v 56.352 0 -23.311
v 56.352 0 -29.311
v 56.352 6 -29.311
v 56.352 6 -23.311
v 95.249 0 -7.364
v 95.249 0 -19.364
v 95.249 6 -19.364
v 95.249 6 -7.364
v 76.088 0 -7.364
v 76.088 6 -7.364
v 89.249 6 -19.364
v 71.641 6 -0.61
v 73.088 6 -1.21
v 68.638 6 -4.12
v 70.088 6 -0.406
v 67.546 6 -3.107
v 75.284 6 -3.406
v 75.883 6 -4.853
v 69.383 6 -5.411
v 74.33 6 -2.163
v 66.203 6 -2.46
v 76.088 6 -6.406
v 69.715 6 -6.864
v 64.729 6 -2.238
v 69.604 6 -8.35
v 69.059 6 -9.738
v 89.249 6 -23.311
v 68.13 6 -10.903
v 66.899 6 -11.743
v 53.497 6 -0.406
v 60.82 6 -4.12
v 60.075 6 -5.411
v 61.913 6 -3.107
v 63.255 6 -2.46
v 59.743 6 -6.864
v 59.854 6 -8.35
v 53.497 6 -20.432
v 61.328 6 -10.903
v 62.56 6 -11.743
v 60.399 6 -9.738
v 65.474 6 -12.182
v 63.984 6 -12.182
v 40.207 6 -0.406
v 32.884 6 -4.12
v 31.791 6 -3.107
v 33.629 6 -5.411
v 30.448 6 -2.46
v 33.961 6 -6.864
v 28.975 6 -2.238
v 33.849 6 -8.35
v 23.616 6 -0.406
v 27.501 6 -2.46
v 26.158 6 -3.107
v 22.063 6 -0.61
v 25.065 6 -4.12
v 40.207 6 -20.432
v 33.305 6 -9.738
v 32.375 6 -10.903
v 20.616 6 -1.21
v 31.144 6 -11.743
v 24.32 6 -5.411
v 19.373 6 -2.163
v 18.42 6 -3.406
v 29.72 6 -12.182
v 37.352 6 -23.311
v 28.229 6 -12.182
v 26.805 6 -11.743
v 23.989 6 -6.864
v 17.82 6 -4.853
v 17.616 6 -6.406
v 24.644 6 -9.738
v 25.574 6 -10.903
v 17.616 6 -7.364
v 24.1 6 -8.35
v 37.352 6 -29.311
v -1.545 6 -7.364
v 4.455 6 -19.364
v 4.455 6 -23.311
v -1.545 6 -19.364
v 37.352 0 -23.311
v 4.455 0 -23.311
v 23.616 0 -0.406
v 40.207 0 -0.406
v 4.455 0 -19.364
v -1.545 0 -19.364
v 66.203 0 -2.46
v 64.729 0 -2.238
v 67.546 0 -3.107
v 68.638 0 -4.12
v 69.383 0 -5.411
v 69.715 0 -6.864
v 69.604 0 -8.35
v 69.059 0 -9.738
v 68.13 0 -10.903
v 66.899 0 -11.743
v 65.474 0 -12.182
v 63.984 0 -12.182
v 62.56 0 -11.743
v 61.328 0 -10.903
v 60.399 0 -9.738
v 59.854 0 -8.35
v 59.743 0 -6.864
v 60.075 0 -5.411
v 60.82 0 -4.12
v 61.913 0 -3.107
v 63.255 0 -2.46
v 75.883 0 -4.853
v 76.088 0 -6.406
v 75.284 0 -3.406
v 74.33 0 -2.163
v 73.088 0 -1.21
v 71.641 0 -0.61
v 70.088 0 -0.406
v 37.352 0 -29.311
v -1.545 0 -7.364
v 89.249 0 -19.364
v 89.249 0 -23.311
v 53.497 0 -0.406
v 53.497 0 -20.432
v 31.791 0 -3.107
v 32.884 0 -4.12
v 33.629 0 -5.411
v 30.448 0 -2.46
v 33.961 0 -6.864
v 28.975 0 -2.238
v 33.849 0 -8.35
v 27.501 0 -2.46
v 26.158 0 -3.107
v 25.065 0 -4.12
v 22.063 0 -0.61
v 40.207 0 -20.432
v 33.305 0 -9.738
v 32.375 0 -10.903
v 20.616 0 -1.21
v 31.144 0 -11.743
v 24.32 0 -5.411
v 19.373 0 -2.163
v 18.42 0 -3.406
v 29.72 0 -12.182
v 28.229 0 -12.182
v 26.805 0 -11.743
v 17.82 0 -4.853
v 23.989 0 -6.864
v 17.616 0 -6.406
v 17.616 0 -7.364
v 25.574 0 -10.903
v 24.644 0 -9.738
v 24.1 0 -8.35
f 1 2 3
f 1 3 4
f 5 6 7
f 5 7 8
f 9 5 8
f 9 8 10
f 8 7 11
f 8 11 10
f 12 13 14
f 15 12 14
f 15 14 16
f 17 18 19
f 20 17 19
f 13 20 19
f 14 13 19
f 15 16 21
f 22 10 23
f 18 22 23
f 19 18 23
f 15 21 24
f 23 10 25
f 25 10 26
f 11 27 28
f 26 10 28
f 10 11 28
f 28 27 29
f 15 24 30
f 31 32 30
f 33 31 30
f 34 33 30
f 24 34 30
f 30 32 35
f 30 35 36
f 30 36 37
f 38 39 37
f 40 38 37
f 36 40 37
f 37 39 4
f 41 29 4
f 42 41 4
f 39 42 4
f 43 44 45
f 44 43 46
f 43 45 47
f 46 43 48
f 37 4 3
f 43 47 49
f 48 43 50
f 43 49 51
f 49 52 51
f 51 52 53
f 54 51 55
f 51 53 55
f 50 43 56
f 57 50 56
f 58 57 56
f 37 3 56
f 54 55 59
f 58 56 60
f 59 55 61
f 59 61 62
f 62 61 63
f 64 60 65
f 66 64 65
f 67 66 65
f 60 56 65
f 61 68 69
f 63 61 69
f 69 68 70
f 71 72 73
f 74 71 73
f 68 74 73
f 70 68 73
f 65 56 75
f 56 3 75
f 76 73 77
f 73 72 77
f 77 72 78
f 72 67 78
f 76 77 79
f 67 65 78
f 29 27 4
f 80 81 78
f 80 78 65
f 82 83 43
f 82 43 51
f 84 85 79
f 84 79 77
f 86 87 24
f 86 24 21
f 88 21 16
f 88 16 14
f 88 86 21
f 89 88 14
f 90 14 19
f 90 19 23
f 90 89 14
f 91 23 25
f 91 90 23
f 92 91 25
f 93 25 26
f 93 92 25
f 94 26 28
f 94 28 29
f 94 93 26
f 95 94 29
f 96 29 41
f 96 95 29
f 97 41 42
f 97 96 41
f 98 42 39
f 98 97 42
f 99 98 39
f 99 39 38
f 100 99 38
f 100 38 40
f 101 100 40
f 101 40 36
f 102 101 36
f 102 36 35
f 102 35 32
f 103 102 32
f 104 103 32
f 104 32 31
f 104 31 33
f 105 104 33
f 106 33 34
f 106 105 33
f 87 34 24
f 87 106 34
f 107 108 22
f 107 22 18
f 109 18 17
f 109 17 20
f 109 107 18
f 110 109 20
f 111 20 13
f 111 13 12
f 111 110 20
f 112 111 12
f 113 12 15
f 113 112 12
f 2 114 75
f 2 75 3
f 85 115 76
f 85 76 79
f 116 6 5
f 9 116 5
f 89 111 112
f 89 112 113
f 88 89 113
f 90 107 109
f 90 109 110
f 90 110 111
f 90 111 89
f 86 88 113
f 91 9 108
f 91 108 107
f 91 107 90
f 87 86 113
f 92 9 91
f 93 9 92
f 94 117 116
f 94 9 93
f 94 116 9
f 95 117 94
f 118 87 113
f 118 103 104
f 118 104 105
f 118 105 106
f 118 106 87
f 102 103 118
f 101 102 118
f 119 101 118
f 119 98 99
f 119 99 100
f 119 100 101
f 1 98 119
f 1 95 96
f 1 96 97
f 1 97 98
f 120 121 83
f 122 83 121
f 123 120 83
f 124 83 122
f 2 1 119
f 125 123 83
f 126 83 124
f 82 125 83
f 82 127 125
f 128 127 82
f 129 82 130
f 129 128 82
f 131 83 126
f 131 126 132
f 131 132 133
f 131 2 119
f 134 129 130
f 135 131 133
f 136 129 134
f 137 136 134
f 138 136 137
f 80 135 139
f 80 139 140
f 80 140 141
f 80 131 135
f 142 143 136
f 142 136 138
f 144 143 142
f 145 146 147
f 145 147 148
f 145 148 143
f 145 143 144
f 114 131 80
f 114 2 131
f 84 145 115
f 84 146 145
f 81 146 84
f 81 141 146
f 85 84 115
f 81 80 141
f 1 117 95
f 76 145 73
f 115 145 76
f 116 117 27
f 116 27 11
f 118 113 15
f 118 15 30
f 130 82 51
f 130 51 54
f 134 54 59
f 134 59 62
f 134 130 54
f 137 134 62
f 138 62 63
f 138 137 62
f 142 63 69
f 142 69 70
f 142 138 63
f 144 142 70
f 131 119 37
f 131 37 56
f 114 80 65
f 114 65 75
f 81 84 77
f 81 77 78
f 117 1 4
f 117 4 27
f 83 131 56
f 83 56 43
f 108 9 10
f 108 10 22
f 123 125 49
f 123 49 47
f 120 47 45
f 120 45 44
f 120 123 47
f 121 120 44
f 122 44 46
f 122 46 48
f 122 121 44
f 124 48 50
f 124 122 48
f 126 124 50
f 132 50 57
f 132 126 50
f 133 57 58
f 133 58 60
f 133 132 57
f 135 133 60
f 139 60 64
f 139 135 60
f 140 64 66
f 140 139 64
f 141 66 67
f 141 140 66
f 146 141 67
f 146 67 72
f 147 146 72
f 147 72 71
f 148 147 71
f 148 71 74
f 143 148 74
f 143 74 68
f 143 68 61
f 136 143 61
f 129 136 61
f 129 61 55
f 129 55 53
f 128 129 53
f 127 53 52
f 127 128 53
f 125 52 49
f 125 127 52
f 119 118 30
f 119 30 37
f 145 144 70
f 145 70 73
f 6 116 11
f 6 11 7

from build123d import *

# Parameters (mm, degrees)
SKETCH1_R           = 5
BOSS_EXTRUDE1_DEPTH = 6


with BuildPart() as part:
    # Sketch1 → Boss-Extrude1 (new body)
    with BuildSketch(Plane(origin=(0, 0, 0), x_dir=(1, 0, 0), z_dir=(0, 1, 0))):
        with BuildLine():
            Line((17.615827491, 6.405693798), (17.615827491, 7.364453077))
            Line((17.615827491, 7.364453077), (-1.545270838, 7.364453077))
            Line((-1.545270838, 7.364453077), (-1.545270838, 19.364453077))
            Line((-1.545270838, 19.364453077), (4.454729162, 19.364453077))
            Line((4.454729162, 19.364453077), (4.454729162, 23.311113477))
            Line((4.454729162, 23.311113477), (37.351818757, 23.311113477))
            Line((37.351818757, 23.311113477), (37.351818757, 29.311113477))
            Line((37.351818757, 29.311113477), (56.351818757, 29.311113477))
            Line((56.351818757, 29.311113477), (56.351818757, 23.311113477))
            Line((56.351818757, 23.311113477), (89.248908352, 23.311113477))
            Line((89.248908352, 23.311113477), (89.248908352, 19.364453077))
            Line((89.248908352, 19.364453077), (95.248908352, 19.364453077))
            Line((95.248908352, 19.364453077), (95.248908352, 7.364453077))
            Line((95.248908352, 7.364453077), (76.087810024, 7.364453077))
            Line((76.087810024, 7.364453077), (76.087810024, 6.405693798))
            ThreePointArc((76.087810024, 6.405693798), (74.330450711, 2.163053111), (70.087810024, 0.405693798))
            Line((70.087810024, 0.405693798), (53.496778433, 0.405693798))
            Line((53.496778433, 0.405693798), (53.496778433, 20.432362651))
            Line((53.496778433, 20.432362651), (40.206859082, 20.432362651))
            Line((40.206859082, 20.432362651), (40.206859082, 0.405693798))
            Line((40.206859082, 0.405693798), (23.615827491, 0.405693798))
            ThreePointArc((23.615827491, 0.405693798), (19.373186804, 2.163053111), (17.615827491, 6.405693798))
        make_face()
        with Locations(Location((28.974519722, 7.237839647, 0), (0, 0, 270))):
            Circle(SKETCH1_R, mode=Mode.SUBTRACT)
        with Locations(Location((64.729117792, 7.237839647, 0), (0, 0, 270))):
            Circle(SKETCH1_R, mode=Mode.SUBTRACT)
    extrude(amount=BOSS_EXTRUDE1_DEPTH)


solid = part.part
